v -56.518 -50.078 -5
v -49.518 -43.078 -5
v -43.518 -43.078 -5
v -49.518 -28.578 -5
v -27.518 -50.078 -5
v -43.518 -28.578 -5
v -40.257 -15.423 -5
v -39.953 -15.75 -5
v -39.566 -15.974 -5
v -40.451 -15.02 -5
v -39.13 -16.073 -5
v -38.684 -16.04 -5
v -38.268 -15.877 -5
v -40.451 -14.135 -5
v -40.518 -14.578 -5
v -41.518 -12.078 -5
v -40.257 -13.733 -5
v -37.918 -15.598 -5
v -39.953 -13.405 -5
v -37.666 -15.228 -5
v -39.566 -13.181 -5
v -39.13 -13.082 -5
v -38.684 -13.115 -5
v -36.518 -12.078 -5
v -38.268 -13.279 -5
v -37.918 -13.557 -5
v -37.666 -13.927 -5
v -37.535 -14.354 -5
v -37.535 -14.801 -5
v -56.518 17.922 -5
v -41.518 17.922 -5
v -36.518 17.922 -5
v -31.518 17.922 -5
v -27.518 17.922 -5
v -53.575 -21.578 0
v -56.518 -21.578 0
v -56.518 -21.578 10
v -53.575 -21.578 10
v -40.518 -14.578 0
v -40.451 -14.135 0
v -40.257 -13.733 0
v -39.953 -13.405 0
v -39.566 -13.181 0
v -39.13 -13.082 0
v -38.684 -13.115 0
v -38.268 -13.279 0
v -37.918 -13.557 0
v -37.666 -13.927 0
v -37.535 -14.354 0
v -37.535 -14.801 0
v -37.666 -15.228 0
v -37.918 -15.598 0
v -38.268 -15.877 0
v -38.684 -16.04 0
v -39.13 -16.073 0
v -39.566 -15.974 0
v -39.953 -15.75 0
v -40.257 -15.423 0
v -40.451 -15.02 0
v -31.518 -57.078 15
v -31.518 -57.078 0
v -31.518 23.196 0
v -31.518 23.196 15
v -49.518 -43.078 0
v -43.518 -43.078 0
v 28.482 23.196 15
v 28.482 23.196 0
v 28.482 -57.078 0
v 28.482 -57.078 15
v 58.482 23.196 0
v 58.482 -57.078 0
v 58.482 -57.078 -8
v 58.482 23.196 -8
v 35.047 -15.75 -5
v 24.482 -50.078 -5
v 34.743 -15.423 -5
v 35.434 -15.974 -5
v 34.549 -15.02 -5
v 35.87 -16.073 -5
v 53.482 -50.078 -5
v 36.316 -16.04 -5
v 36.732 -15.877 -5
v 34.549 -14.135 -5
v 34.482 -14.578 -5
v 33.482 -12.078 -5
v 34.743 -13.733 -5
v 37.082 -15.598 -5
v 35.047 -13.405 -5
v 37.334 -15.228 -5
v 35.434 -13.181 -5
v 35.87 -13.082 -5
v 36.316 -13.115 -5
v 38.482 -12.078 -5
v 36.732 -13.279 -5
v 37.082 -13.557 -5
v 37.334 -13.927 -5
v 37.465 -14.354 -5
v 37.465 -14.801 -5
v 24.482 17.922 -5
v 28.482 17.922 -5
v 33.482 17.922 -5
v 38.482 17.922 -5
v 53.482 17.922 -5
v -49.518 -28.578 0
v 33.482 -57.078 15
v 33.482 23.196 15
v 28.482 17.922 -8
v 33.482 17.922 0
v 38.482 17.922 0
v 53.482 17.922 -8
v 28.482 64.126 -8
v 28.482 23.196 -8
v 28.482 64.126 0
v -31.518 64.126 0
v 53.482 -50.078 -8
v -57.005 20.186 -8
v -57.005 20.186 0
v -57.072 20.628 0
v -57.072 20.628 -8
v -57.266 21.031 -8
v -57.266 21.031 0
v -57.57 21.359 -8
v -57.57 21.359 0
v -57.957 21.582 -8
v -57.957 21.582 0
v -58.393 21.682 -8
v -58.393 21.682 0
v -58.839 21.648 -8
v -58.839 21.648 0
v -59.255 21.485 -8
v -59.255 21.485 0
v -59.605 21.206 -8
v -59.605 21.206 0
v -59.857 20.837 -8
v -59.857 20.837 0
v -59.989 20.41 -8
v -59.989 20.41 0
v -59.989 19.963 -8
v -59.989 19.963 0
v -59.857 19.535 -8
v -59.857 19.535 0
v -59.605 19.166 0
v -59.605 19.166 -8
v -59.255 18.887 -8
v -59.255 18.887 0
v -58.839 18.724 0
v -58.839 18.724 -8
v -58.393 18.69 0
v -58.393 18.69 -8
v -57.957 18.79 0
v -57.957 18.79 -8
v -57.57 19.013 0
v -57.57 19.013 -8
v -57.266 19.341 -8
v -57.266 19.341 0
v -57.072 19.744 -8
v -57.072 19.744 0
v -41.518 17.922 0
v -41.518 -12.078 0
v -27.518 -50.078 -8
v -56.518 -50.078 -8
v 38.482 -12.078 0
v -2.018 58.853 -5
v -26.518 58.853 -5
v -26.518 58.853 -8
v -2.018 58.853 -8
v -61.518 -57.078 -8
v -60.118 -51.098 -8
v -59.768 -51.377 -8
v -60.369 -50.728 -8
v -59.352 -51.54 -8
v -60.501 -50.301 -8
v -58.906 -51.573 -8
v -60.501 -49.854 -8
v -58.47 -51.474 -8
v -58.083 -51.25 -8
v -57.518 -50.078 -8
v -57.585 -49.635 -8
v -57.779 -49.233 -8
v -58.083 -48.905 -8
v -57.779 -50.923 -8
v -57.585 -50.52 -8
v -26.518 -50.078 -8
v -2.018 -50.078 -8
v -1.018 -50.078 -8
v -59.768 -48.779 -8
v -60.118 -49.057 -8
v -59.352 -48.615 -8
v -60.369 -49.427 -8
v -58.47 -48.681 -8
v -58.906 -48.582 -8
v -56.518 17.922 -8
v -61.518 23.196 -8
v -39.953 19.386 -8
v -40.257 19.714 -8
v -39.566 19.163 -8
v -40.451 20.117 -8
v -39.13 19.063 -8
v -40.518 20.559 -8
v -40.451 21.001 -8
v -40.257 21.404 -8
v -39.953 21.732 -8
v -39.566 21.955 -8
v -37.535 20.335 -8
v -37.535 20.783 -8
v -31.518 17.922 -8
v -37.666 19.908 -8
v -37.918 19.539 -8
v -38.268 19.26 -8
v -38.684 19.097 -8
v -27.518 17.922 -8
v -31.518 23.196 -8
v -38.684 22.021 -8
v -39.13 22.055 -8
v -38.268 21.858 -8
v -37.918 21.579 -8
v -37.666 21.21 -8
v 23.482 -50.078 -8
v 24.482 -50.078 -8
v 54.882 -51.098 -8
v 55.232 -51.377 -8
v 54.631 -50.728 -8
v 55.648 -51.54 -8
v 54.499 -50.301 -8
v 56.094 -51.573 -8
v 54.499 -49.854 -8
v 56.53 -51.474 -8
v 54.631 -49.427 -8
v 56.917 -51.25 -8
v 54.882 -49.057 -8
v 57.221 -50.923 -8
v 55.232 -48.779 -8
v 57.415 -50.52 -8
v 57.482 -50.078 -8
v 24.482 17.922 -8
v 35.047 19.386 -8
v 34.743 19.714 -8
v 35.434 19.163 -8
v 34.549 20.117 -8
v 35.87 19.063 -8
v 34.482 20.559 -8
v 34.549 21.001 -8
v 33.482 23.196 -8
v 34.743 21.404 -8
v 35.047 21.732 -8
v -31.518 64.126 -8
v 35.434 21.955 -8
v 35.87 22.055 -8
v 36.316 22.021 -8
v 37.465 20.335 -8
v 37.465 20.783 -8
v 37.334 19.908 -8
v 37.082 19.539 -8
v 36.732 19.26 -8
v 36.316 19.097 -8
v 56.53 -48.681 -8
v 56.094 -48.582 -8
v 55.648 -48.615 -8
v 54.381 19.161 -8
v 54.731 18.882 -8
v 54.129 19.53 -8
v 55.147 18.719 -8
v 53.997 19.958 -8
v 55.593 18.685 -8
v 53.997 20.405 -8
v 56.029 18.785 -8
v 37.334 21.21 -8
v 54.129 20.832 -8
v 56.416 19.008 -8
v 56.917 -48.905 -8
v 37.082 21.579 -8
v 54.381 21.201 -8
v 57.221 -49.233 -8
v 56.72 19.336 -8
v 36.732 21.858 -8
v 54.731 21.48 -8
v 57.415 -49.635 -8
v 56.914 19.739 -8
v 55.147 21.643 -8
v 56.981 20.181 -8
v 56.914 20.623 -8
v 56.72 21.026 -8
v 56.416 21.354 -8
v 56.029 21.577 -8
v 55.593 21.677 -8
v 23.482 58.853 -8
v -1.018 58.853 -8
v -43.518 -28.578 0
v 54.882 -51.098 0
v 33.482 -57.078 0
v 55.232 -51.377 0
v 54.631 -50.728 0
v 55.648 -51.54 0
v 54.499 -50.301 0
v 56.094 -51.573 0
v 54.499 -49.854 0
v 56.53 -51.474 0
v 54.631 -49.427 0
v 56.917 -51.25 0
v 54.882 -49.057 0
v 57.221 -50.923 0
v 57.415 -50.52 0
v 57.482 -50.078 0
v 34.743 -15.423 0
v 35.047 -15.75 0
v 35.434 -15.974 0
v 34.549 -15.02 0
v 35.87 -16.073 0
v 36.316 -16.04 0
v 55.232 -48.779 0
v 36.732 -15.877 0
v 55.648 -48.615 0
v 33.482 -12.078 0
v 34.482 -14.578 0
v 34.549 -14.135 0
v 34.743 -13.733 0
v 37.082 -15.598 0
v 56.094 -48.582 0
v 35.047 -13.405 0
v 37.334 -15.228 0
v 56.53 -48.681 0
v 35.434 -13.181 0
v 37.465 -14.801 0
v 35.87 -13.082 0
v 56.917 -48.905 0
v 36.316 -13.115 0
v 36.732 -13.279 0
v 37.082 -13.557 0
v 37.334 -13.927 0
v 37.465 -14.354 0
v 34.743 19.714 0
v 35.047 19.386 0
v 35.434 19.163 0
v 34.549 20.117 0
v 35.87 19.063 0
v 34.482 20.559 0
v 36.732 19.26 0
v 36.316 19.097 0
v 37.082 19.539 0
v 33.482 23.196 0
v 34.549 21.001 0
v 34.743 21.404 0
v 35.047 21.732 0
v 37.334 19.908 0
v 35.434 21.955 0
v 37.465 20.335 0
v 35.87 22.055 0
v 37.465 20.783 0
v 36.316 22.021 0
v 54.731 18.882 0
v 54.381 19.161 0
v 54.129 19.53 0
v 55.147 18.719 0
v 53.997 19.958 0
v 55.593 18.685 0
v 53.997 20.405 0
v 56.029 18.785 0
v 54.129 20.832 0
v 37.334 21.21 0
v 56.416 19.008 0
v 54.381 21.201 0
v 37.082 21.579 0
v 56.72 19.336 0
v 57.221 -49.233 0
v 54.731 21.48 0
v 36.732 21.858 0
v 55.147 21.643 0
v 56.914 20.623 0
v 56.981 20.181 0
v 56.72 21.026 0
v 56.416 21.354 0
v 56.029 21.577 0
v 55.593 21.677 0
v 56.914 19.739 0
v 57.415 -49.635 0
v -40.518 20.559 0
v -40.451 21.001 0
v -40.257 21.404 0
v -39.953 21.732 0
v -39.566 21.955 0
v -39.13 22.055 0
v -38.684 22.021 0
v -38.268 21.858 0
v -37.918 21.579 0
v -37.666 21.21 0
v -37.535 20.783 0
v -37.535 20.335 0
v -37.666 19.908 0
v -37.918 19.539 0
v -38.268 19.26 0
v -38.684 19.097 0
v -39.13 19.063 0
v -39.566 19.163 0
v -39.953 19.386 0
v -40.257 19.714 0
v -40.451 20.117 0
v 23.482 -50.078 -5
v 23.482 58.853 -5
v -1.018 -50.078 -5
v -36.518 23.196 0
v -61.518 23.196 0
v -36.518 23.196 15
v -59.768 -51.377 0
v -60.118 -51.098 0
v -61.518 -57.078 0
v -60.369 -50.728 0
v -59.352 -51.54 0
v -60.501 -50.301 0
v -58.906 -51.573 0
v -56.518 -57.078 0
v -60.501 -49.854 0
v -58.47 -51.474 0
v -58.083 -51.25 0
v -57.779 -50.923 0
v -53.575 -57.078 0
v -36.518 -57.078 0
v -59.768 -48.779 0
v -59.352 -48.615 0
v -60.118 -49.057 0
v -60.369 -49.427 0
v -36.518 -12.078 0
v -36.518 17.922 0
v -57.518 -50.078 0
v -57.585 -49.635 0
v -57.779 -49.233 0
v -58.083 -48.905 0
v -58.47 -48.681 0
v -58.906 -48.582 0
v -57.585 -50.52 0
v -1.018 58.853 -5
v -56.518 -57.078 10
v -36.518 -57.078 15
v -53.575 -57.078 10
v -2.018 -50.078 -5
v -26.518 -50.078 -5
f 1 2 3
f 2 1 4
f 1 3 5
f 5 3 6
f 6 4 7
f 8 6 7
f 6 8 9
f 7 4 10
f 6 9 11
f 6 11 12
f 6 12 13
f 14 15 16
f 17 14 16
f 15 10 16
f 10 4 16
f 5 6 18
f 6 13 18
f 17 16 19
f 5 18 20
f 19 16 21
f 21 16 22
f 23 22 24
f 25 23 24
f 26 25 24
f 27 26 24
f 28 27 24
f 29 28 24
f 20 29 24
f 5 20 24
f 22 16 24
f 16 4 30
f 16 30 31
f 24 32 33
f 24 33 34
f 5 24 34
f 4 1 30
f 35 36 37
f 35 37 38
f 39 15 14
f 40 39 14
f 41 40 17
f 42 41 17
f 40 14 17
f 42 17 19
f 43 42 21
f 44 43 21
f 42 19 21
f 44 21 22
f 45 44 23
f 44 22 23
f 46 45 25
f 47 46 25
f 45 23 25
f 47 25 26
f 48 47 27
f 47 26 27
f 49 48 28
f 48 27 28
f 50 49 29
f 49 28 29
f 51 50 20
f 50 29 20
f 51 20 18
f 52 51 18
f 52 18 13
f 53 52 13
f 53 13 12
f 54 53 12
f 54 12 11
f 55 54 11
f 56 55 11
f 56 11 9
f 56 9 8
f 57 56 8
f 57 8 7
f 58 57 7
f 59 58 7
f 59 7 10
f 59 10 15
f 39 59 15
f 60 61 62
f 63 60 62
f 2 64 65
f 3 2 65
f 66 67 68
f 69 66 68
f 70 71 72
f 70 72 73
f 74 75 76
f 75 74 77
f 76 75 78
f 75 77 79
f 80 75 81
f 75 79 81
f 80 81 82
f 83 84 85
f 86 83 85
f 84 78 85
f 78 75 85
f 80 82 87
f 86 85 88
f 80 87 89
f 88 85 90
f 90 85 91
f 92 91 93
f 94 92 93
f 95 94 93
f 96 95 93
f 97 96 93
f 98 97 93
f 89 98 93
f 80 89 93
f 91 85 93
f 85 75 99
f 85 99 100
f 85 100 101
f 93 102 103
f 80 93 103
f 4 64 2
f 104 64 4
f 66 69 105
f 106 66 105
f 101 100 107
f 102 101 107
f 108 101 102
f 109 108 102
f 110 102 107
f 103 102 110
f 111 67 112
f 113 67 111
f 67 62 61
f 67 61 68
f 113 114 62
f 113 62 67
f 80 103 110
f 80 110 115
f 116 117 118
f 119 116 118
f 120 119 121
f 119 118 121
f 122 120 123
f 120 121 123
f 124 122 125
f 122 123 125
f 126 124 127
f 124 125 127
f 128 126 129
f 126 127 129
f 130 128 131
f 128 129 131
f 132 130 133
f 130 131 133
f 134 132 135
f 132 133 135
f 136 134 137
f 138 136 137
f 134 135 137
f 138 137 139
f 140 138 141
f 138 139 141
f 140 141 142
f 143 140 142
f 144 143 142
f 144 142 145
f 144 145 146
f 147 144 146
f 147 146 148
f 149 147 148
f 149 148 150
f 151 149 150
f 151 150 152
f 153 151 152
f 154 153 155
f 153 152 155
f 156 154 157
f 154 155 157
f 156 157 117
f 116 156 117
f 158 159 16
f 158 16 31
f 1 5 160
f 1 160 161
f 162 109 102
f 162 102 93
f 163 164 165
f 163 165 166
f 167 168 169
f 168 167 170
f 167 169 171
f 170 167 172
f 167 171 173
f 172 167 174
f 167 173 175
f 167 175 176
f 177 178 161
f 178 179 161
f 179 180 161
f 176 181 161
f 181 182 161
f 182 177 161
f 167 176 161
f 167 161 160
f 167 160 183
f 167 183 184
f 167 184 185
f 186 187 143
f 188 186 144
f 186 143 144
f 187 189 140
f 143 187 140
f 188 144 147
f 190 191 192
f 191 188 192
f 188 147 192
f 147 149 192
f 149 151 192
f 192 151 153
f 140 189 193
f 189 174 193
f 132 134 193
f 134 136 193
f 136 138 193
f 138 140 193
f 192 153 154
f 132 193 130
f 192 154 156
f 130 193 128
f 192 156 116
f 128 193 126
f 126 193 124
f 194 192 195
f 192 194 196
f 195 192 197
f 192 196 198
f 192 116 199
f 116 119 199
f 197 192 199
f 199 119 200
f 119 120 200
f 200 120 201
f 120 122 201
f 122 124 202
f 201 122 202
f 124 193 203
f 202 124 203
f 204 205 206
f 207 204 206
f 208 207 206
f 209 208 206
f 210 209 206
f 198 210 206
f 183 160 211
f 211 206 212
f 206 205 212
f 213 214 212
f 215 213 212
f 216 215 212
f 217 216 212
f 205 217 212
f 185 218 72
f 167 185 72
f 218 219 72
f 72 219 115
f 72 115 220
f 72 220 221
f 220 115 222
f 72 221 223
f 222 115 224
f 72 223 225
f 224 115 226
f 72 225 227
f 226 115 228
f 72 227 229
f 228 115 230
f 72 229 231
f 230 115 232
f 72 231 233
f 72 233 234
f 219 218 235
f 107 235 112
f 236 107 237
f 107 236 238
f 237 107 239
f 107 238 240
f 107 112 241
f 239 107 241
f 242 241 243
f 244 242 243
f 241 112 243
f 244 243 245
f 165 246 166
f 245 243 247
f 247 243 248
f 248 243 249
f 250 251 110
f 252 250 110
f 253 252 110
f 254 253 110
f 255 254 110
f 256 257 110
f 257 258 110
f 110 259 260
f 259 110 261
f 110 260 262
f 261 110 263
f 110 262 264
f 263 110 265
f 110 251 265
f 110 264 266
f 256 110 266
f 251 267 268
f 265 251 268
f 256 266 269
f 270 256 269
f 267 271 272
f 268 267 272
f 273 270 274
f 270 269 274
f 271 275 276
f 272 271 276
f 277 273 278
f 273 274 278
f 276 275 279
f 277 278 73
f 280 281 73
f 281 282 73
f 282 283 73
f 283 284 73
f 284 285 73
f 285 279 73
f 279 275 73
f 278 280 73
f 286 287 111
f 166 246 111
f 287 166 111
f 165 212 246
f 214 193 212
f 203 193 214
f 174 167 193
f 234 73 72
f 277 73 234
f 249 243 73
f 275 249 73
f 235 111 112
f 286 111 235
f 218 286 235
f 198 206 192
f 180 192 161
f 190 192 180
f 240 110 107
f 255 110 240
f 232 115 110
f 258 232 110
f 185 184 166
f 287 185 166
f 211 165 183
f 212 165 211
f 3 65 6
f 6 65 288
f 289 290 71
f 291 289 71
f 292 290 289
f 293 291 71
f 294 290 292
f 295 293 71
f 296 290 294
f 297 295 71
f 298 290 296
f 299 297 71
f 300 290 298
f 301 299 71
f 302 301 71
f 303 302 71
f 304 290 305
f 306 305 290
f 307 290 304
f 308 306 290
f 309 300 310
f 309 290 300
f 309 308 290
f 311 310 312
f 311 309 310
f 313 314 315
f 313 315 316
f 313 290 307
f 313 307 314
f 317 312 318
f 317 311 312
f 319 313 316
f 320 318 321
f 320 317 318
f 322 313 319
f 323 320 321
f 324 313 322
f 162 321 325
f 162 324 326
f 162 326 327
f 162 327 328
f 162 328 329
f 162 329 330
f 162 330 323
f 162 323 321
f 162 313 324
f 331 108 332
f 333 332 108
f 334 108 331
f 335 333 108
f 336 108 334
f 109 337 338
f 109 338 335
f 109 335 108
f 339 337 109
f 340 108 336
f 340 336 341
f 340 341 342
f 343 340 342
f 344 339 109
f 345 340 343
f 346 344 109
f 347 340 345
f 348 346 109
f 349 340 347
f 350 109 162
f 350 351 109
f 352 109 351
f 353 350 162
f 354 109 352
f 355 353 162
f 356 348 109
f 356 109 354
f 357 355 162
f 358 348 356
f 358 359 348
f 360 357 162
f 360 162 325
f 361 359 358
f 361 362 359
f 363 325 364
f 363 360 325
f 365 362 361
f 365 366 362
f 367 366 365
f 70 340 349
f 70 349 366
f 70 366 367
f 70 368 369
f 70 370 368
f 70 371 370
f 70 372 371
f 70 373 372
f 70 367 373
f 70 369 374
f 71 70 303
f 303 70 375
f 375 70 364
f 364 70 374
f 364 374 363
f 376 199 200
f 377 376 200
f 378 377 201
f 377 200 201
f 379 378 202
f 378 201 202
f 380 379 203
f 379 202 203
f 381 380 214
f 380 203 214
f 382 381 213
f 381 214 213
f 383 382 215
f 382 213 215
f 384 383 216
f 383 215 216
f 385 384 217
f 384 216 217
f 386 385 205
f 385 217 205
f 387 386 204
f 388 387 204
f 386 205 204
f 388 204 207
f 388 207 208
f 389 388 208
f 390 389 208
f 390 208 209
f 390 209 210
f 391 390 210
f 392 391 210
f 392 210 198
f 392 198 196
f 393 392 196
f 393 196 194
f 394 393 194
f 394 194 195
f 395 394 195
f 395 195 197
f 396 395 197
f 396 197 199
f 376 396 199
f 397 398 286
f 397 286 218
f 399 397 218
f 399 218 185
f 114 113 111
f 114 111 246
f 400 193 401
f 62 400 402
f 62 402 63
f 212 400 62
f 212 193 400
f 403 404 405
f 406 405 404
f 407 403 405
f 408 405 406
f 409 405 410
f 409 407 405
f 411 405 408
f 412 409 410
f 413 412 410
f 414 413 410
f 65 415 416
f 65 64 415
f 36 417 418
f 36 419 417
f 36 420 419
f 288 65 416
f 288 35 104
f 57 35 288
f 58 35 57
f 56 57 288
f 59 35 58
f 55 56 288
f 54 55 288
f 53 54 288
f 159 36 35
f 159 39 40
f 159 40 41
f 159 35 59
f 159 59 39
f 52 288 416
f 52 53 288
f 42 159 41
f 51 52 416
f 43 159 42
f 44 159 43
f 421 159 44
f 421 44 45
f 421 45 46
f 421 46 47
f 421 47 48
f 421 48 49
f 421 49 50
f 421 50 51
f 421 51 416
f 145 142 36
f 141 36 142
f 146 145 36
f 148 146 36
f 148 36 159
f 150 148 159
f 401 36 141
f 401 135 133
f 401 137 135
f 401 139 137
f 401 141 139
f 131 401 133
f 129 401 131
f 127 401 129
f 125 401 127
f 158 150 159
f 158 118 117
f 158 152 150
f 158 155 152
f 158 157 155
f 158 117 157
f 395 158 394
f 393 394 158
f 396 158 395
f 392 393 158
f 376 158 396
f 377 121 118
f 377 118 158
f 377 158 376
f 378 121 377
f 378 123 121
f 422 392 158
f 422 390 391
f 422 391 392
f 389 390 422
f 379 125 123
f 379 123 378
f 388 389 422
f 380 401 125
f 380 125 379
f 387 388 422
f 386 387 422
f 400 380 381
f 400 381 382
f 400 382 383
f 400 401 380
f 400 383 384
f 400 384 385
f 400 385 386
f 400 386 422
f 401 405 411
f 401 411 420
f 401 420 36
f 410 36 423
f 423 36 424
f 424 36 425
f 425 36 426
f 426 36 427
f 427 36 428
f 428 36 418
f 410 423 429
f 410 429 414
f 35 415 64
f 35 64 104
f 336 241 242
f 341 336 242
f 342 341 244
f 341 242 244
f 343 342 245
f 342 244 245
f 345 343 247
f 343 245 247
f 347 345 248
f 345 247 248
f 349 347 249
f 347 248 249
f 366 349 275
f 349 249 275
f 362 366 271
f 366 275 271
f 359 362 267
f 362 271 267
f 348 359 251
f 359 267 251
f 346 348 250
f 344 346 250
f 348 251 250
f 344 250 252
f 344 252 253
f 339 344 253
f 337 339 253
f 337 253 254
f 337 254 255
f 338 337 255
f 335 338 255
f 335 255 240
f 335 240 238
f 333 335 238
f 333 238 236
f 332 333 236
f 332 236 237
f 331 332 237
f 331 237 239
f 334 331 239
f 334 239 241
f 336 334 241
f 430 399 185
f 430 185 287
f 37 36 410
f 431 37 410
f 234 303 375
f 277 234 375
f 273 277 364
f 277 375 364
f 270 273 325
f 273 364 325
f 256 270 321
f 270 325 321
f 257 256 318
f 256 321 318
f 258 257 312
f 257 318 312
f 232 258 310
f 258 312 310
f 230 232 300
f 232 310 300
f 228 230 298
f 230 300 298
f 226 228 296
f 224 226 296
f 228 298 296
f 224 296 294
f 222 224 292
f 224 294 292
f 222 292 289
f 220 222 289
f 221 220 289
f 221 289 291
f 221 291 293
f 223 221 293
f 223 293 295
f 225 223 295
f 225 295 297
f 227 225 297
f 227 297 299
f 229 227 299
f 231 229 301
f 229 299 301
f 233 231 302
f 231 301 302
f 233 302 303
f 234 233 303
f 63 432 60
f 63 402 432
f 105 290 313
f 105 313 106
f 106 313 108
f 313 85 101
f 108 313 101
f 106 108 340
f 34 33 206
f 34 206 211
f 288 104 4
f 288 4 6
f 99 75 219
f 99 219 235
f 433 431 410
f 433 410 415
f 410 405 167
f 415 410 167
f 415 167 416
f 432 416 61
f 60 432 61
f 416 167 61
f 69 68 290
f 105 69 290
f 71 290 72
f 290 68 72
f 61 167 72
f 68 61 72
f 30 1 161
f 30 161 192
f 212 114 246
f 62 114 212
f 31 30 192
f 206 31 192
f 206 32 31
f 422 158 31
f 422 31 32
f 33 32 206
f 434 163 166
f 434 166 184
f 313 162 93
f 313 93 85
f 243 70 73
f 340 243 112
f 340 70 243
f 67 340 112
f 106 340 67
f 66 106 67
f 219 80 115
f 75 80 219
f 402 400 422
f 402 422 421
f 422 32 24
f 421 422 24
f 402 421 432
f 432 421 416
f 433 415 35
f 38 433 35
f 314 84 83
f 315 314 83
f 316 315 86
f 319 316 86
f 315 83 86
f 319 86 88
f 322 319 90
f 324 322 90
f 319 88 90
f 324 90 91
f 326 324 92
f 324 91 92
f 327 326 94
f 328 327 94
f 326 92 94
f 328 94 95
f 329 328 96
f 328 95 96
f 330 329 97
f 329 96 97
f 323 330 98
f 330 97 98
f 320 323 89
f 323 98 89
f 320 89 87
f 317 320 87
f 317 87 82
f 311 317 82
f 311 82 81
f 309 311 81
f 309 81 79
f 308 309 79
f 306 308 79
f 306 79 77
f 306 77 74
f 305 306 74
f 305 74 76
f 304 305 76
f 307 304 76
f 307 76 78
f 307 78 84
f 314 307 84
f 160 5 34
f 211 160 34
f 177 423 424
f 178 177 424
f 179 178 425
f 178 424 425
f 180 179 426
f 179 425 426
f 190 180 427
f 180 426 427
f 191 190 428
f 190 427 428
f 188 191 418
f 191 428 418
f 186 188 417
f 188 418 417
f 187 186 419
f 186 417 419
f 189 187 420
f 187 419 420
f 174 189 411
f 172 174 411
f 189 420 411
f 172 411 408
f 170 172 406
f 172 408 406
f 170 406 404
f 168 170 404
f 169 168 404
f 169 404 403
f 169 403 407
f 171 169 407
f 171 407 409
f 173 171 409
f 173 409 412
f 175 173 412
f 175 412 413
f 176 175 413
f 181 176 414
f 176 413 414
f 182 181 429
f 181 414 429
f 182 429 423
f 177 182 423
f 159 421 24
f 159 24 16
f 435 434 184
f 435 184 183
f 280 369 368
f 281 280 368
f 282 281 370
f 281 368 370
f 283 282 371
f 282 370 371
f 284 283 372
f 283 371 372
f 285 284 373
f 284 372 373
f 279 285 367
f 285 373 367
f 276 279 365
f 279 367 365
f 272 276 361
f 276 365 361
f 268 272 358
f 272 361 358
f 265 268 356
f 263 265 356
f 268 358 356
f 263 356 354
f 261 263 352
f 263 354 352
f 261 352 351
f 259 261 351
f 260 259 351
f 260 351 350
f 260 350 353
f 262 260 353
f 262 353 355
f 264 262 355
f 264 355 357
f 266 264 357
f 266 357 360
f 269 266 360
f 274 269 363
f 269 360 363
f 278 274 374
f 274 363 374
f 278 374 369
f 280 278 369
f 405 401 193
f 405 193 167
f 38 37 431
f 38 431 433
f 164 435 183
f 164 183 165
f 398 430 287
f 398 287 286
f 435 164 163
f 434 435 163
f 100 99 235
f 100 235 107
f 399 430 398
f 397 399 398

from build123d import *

# Parameters (mm, degrees)
F0_W     = 2.9425137265
F0_H     = 28.5
F0_W_2   = 6
F0_H_2   = 14.5
F0_W_3   = 4
F0_H_3   = 68
F0_W_4   = 1
F1_DEPTH = 5
F0_R     = 1.5
F0_W_5   = 5
F0_H_4   = 5.2732650286
F0_H_5   = 7
F0_W_6   = 17.0574862735
F0_H_6   = 5.2732627955
F2_DEPTH = 8
F3_DEPTH = 15
F4_DEPTH = 10
F5_D     = 3


# Not quite as in the source:
# - a feature names something its author has since deleted; it is built from what else it names


with BuildPart() as f1:
    # F0 (on Top) → F1 (new body)
    with BuildSketch(Plane.XY):
        with Locations((-55.0466683022, -35.8276315331)):
            Rectangle(F0_W, F0_H)
        Polygon((-53.5754114389, -21.5776315331), (-53.5754114389, -50.0776315331), (-36.5179251655, -50.0776315331), (-36.5179251655, -12.0776315331), (-41.5179251655, -12.0776315331), (-41.5179251655, 17.9223684669), (-56.5179251655, 17.9223684669), (-56.5179251655, -21.5776315331), align=None)
        with Locations((-46.5179251655, -35.8276315331)):
            Rectangle(F0_W_2, F0_H_2, mode=Mode.SUBTRACT)
        Polygon((-36.5179251655, -12.0776315331), (-36.5179251655, -50.0776315331), (-31.5179251655, -50.0776315331), (-31.5179251655, 17.9223684669), (-36.5179251655, 17.9223684669), align=None)
        with Locations((-29.5179251655, -16.0776315331)):
            Rectangle(F0_W_3, F0_H_3)
        with Locations((-27.0179251655, -16.0776315331)):
            Rectangle(F0_W_4, F0_H_3)
        Polygon((-31.5179251655, 23.1956334954), (-31.5179251655, 17.9223684669), (-27.5179251655, 17.9223684669), (-26.5179251655, 17.9223684669), (-26.5179251655, 58.8525284669), (-2.0179251655, 58.8525284669), (-1.5179251655, 58.8525284669), (-1.0179251655, 58.8525284669), (23.4820748345, 58.8525284669), (23.4820748345, 17.9223684669), (24.4820748345, 17.9223684669), (28.4820748345, 17.9223684669), (28.4820748345, 23.1956312623), (28.4820748345, 64.1257884669), (-31.5179251655, 64.1257884669), align=None)
        Polygon((-26.5179251655, 17.9223684669), (-26.5179251655, -50.0776315331), (-2.0179251655, -50.0776315331), (-2.0179251655, 58.8525284669), (-26.5179251655, 58.8525284669), align=None)
        Polygon((-2.0179251655, 58.8525284669), (-2.0179251655, -50.0776315331), (-1.0179251655, -50.0776315331), (-1.0179251655, 58.8525284669), (-1.5179251655, 58.8525284669), align=None)
        Polygon((28.4820748345, 17.9223684669), (28.4820748345, -50.0776315331), (33.4820748345, -50.0776315331), (33.4820748345, -17.0776315331), (33.4820748345, -12.0776315331), (33.4820748345, 17.9223684669), align=None)
        with Locations((26.4820748345, -16.0776315331)):
            Rectangle(F0_W_3, F0_H_3)
        Polygon((-1.0179251655, 58.8525284669), (-1.0179251655, -50.0776315331), (23.4820748345, -50.0776315331), (23.4820748345, 17.9223684669), (23.4820748345, 58.8525284669), align=None)
        Polygon((33.4820748345, -17.0776315331), (33.4820748345, -50.0776315331), (53.4820748345, -50.0776315331), (53.4820748345, 17.9223684669), (38.4820748345, 17.9223684669), (38.4820748345, -12.0776315331), (33.4820748345, -12.0776315331), align=None)
        with Locations((23.9820748345, -16.0776315331)):
            Rectangle(F0_W_4, F0_H_3)
    extrude(amount=-F1_DEPTH)

    # F0 (on Top) → F2 (join)
    with BuildSketch(Plane.XY):
        Polygon((-27.5179251655, -50.0776315331), (-31.5179251655, -50.0776315331), (-31.5179251655, -57.0776315331), (28.4820748345, -57.0776315331), (28.4820748345, -50.0776315331), (24.4820748345, -50.0776315331), (23.4820748345, -50.0776315331), (-1.0179251655, -50.0776315331), (-2.0179251655, -50.0776315331), (-26.5179251655, -50.0776315331), align=None)
        Polygon((-56.5179251655, -57.0776315331), (-56.5179251655, -50.0776315331), (-56.5179251655, -21.5776315331), (-56.5179251655, 17.9223684669), (-41.5179251655, 17.9223684669), (-36.5179251655, 17.9223684669), (-36.5179251655, 23.1956334954), (-61.5179251655, 23.1956334954), (-61.5179251655, -57.0776315331), align=None)
        with Locations((-59.0179251655, -50.0776315331)):
            Circle(F0_R, mode=Mode.SUBTRACT)
        with Locations((-58.5054894246, 20.1860783767)):
            Circle(F0_R, mode=Mode.SUBTRACT)
        Polygon((33.4820748345, -50.0776315331), (33.4820748345, -57.0776315331), (58.4820748345, -57.0776315331), (58.4820748345, 23.1956312623), (33.4820748345, 23.1956312623), (33.4820748345, 17.9223684669), (38.4820748345, 17.9223684669), (53.4820748345, 17.9223684669), (53.4820748345, -50.0776315331), align=None)
        with Locations((55.9820748345, -50.0776315331)):
            Circle(F0_R, mode=Mode.SUBTRACT)
        with Locations((55.4806331986, 20.1810636766)):
            Circle(F0_R, mode=Mode.SUBTRACT)
        with Locations((-34.0179251655, 20.5590009811)):
            Rectangle(F0_W_5, F0_H_4)
        with Locations((-55.0466683022, -53.5776315331)):
            Rectangle(F0_W, F0_H_5)
        with Locations((-45.0466683022, -53.5776315331)):
            Rectangle(F0_W_6, F0_H_5)
        with Locations((-34.0179251655, -53.5776315331)):
            Rectangle(F0_W_5, F0_H_5)
        with Locations((30.9820748345, -53.5776315331)):
            Rectangle(F0_W_5, F0_H_5)
        with Locations((-27.0179251655, -16.0776315331)):
            Rectangle(F0_W_4, F0_H_3)
        with Locations((23.9820748345, -16.0776315331)):
            Rectangle(F0_W_4, F0_H_3)
        Polygon((-2.0179251655, 58.8525284669), (-2.0179251655, -50.0776315331), (-1.0179251655, -50.0776315331), (-1.0179251655, 58.8525284669), (-1.5179251655, 58.8525284669), align=None)
        with Locations((30.9820748345, 20.5589998646)):
            Rectangle(F0_W_5, F0_H_6)
        with Locations((-34.0179251655, 20.5590009811)):
            Rectangle(F0_W_5, F0_H_4)
        Polygon((-31.5179251655, 23.1956334954), (-31.5179251655, 17.9223684669), (-27.5179251655, 17.9223684669), (-26.5179251655, 17.9223684669), (-26.5179251655, 58.8525284669), (-2.0179251655, 58.8525284669), (-1.5179251655, 58.8525284669), (-1.0179251655, 58.8525284669), (23.4820748345, 58.8525284669), (23.4820748345, 17.9223684669), (24.4820748345, 17.9223684669), (28.4820748345, 17.9223684669), (28.4820748345, 23.1956312623), (28.4820748345, 64.1257884669), (-31.5179251655, 64.1257884669), align=None)
        with Locations((30.9820748345, 20.5589998646)):
            Rectangle(F0_W_5, F0_H_6)
        with Locations((-34.0179251655, 20.5590009811)):
            Rectangle(F0_W_5, F0_H_4)
    extrude(amount=-F2_DEPTH)

    # F0 (on Top) → F3 (join)
    with BuildSketch(Plane.XY):
        Polygon((-36.5179251655, -12.0776315331), (-36.5179251655, -50.0776315331), (-31.5179251655, -50.0776315331), (-31.5179251655, 17.9223684669), (-36.5179251655, 17.9223684669), align=None)
        with Locations((-34.0179251655, -53.5776315331)):
            Rectangle(F0_W_5, F0_H_5)
        with Locations((-34.0179251655, 20.5590009811)):
            Rectangle(F0_W_5, F0_H_4)
        with Locations((30.9820748345, -53.5776315331)):
            Rectangle(F0_W_5, F0_H_5)
        Polygon((28.4820748345, 17.9223684669), (28.4820748345, -50.0776315331), (33.4820748345, -50.0776315331), (33.4820748345, -17.0776315331), (33.4820748345, -12.0776315331), (33.4820748345, 17.9223684669), align=None)
        with Locations((30.9820748345, 20.5589998646)):
            Rectangle(F0_W_5, F0_H_6)
    extrude(amount=F3_DEPTH)

    # F0 (on Top) → F4 (join)
    with BuildSketch(Plane.XY):
        with Locations((-55.0466683022, -35.8276315331)):
            Rectangle(F0_W, F0_H)
        with Locations((-55.0466683022, -53.5776315331)):
            Rectangle(F0_W, F0_H_5)
    extrude(amount=F4_DEPTH)

    # F5 (through all)
    with Locations(Plane.XY):
        with Locations((35.9820748345, 20.5589998646), (35.9820748345, -14.5776315331), (-39.0179251655, 20.5589998646), (-39.0179251655, -14.5776315331)):
            Hole(F5_D / 2)


solid = f1.part
